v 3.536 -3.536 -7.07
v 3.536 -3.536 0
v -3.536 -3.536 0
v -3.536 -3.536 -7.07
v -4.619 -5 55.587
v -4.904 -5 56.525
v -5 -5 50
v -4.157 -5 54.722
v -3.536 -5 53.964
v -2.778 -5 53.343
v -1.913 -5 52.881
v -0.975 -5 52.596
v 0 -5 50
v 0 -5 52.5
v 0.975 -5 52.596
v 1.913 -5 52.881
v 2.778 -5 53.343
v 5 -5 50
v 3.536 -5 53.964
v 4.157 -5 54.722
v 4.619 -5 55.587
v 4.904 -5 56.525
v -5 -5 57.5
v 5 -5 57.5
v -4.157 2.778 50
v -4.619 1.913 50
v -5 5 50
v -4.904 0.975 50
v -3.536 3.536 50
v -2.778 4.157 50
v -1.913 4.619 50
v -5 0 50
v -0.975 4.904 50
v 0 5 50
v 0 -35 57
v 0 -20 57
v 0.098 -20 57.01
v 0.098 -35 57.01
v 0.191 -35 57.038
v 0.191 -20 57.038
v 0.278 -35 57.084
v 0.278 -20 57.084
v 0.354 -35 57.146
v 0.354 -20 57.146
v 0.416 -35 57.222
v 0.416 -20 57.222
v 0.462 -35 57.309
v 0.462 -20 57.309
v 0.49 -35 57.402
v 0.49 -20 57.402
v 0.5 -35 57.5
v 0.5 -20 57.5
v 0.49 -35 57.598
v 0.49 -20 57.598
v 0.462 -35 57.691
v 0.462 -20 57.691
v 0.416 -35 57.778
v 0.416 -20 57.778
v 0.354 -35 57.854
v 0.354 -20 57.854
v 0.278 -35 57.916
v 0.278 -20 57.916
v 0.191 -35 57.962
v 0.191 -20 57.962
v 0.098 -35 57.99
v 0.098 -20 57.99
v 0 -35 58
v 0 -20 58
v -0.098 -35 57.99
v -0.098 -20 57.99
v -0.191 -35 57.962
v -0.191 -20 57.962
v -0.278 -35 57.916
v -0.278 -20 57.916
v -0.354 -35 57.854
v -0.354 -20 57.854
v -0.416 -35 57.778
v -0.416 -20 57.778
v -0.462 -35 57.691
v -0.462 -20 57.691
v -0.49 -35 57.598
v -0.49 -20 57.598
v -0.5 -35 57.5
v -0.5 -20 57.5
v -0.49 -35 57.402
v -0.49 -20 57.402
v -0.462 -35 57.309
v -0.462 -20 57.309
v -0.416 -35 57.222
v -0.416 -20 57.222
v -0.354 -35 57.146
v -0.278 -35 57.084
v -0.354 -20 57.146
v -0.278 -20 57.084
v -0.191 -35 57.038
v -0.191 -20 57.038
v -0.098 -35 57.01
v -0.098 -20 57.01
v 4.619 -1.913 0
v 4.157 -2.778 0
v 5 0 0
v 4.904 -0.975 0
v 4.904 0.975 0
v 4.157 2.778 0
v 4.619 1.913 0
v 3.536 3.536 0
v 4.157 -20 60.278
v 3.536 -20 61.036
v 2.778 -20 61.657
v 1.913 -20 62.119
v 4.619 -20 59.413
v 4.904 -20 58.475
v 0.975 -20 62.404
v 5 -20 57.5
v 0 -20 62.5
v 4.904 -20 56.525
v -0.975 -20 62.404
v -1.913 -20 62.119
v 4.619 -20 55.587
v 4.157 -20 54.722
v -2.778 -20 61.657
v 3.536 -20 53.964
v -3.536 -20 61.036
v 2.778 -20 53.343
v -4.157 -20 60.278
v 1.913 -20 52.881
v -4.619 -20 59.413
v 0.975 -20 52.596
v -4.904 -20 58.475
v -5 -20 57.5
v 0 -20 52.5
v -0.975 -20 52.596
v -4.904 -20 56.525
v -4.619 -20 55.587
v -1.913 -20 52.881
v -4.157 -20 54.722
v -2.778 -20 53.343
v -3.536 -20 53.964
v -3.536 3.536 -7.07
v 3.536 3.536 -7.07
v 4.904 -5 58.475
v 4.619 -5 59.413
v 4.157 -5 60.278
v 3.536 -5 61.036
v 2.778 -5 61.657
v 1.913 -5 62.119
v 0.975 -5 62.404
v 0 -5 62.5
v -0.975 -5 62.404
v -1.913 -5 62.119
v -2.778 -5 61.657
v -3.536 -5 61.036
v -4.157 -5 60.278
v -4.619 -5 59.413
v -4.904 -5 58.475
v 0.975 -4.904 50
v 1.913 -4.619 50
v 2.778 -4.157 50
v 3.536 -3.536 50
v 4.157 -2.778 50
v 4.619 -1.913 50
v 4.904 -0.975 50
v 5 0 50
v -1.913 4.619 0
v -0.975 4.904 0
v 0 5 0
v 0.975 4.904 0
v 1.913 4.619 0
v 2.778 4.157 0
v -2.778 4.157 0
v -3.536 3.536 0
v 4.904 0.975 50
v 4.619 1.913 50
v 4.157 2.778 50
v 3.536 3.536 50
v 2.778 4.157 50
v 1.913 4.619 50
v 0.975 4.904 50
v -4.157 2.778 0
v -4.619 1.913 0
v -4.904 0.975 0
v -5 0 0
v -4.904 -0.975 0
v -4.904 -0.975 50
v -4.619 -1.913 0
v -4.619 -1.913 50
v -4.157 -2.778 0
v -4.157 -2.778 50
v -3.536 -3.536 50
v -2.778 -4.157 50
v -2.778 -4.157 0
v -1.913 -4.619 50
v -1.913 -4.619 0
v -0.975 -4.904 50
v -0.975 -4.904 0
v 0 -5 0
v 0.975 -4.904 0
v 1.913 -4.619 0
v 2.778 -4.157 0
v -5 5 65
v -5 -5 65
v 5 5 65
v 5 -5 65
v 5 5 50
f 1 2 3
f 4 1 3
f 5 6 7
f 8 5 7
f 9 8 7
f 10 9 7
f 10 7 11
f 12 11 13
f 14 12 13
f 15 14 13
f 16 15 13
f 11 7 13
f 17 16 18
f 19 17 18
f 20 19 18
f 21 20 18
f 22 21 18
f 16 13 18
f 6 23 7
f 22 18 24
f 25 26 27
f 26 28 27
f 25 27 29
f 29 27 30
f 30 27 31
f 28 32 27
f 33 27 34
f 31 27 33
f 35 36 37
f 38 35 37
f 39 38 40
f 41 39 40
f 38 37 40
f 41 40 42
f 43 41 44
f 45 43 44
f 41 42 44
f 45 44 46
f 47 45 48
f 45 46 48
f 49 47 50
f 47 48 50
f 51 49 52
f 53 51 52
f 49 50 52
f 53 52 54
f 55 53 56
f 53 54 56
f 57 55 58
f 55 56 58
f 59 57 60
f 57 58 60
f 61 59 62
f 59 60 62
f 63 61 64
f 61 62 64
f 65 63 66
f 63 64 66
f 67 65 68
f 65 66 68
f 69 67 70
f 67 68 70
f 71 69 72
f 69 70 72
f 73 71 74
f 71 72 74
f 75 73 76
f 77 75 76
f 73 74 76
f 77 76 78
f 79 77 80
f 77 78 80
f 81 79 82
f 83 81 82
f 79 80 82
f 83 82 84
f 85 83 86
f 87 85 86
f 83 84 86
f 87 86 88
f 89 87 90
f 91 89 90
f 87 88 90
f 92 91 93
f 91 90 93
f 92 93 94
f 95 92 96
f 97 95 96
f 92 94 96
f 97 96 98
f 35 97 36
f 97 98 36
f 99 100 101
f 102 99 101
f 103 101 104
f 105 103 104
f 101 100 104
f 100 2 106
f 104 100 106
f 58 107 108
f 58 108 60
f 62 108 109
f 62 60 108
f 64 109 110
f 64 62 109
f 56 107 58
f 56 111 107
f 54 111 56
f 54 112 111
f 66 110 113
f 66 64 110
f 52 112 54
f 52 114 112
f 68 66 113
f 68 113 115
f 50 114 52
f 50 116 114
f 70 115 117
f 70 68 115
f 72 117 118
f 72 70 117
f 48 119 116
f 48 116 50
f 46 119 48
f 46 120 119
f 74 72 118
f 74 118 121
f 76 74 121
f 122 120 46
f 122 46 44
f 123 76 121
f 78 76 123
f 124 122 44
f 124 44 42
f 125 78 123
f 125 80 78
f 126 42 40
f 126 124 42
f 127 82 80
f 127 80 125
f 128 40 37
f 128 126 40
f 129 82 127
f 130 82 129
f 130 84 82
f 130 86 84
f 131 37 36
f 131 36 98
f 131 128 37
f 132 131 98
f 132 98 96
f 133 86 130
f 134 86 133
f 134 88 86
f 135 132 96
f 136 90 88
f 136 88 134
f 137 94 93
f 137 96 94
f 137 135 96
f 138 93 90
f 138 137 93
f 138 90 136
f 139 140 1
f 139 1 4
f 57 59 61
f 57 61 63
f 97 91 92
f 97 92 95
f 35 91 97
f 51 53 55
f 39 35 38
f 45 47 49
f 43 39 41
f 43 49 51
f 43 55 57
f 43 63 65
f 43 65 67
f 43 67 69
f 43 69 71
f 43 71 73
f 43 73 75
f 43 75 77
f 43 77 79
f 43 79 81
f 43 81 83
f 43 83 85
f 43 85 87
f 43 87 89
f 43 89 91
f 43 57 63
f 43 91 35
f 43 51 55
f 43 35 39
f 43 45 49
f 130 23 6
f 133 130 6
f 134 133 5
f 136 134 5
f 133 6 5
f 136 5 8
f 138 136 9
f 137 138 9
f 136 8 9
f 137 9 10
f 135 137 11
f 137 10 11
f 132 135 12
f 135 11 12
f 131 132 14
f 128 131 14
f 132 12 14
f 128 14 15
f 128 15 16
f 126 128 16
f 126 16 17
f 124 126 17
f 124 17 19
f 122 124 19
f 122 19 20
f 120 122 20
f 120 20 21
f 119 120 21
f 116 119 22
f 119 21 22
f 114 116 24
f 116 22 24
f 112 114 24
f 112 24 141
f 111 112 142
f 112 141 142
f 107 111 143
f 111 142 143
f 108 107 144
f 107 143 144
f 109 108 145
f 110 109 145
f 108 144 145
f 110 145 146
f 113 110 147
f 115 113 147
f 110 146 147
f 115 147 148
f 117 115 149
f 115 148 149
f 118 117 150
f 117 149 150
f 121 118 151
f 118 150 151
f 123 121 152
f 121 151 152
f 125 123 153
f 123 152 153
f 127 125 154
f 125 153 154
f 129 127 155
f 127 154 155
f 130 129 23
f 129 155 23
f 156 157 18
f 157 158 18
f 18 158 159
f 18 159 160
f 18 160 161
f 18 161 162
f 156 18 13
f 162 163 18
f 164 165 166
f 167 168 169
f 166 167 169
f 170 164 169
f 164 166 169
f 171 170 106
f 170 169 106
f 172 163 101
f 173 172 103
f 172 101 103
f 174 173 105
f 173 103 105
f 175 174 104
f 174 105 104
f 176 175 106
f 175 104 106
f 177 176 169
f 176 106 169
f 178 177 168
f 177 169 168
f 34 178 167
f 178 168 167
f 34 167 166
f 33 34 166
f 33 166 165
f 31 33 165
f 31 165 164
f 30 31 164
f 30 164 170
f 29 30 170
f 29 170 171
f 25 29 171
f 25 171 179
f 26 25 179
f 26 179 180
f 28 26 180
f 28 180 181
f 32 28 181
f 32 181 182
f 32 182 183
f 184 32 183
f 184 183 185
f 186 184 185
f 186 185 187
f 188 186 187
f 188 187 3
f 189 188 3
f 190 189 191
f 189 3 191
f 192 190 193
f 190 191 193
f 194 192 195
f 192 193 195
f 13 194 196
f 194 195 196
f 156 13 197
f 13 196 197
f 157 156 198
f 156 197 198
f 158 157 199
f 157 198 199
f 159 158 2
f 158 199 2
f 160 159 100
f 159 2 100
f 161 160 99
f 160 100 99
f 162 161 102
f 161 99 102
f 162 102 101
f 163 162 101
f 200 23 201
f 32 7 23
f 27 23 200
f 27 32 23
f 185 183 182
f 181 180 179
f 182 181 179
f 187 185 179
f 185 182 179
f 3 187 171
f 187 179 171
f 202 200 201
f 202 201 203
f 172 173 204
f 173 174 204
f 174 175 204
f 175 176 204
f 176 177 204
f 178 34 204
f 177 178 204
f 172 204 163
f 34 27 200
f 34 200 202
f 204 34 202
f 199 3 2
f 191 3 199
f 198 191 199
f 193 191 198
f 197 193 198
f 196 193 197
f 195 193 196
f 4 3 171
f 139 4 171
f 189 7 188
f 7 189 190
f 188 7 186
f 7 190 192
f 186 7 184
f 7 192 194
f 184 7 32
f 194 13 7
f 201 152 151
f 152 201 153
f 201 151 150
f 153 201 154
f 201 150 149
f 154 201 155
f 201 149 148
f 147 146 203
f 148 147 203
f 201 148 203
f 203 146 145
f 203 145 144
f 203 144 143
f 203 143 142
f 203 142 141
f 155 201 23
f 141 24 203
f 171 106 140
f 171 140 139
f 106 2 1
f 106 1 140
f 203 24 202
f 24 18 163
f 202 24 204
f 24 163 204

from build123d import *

# Parameters (mm, degrees)
CROQUIS2_R              = 5
SALIENTE_EXTRUIR1_DEPTH = 50
CROQUIS3_W              = 10
CROQUIS3_H              = 10
SALIENTE_EXTRUIR2_DEPTH = 15
CROQUIS5_R              = 5
SALIENTE_EXTRUIR3_DEPTH = 15
CROQUIS8_R              = 0.5
SALIENTE_EXTRUIR4_DEPTH = 15
CROQUIS11_W             = 7.071067812
CROQUIS11_H             = 7.071067812
SALIENTE_EXTRUIR5_DEPTH = 7.07


with BuildPart() as part:
    # Croquis2 → Saliente-Extruir1 (new body)
    with BuildSketch(Plane.XY):
        Circle(CROQUIS2_R)
    extrude(amount=SALIENTE_EXTRUIR1_DEPTH)

    # Croquis3 → Saliente-Extruir2 (add)
    with BuildSketch(Plane.XY.offset(50)):
        Rectangle(CROQUIS3_W, CROQUIS3_H)
    extrude(amount=SALIENTE_EXTRUIR2_DEPTH)

    # Croquis5 → Saliente-Extruir3 (add)
    with BuildSketch(Plane.XZ.offset(5)):
        with Locations(Location((0, 57.5, 0), (0, 0, 180))):  # turned: the seam where the file's is
            Circle(CROQUIS5_R)
    extrude(amount=SALIENTE_EXTRUIR3_DEPTH)

    # Croquis8 → Saliente-Extruir4 (add)
    with BuildSketch(Plane.XZ.offset(20)):
        with Locations(Location((0, 57.5, 0), (0, 0, 270))):  # turned: the seam where the file's is
            Circle(CROQUIS8_R)
    extrude(amount=SALIENTE_EXTRUIR4_DEPTH)

    # Croquis11 → Saliente-Extruir5 (add)
    with BuildSketch(Plane(origin=(0, 0, 0), x_dir=(-1, 0, 0), z_dir=(0, 0, -1))):
        Rectangle(CROQUIS11_W, CROQUIS11_H)
    extrude(amount=SALIENTE_EXTRUIR5_DEPTH)


solid = part.part
